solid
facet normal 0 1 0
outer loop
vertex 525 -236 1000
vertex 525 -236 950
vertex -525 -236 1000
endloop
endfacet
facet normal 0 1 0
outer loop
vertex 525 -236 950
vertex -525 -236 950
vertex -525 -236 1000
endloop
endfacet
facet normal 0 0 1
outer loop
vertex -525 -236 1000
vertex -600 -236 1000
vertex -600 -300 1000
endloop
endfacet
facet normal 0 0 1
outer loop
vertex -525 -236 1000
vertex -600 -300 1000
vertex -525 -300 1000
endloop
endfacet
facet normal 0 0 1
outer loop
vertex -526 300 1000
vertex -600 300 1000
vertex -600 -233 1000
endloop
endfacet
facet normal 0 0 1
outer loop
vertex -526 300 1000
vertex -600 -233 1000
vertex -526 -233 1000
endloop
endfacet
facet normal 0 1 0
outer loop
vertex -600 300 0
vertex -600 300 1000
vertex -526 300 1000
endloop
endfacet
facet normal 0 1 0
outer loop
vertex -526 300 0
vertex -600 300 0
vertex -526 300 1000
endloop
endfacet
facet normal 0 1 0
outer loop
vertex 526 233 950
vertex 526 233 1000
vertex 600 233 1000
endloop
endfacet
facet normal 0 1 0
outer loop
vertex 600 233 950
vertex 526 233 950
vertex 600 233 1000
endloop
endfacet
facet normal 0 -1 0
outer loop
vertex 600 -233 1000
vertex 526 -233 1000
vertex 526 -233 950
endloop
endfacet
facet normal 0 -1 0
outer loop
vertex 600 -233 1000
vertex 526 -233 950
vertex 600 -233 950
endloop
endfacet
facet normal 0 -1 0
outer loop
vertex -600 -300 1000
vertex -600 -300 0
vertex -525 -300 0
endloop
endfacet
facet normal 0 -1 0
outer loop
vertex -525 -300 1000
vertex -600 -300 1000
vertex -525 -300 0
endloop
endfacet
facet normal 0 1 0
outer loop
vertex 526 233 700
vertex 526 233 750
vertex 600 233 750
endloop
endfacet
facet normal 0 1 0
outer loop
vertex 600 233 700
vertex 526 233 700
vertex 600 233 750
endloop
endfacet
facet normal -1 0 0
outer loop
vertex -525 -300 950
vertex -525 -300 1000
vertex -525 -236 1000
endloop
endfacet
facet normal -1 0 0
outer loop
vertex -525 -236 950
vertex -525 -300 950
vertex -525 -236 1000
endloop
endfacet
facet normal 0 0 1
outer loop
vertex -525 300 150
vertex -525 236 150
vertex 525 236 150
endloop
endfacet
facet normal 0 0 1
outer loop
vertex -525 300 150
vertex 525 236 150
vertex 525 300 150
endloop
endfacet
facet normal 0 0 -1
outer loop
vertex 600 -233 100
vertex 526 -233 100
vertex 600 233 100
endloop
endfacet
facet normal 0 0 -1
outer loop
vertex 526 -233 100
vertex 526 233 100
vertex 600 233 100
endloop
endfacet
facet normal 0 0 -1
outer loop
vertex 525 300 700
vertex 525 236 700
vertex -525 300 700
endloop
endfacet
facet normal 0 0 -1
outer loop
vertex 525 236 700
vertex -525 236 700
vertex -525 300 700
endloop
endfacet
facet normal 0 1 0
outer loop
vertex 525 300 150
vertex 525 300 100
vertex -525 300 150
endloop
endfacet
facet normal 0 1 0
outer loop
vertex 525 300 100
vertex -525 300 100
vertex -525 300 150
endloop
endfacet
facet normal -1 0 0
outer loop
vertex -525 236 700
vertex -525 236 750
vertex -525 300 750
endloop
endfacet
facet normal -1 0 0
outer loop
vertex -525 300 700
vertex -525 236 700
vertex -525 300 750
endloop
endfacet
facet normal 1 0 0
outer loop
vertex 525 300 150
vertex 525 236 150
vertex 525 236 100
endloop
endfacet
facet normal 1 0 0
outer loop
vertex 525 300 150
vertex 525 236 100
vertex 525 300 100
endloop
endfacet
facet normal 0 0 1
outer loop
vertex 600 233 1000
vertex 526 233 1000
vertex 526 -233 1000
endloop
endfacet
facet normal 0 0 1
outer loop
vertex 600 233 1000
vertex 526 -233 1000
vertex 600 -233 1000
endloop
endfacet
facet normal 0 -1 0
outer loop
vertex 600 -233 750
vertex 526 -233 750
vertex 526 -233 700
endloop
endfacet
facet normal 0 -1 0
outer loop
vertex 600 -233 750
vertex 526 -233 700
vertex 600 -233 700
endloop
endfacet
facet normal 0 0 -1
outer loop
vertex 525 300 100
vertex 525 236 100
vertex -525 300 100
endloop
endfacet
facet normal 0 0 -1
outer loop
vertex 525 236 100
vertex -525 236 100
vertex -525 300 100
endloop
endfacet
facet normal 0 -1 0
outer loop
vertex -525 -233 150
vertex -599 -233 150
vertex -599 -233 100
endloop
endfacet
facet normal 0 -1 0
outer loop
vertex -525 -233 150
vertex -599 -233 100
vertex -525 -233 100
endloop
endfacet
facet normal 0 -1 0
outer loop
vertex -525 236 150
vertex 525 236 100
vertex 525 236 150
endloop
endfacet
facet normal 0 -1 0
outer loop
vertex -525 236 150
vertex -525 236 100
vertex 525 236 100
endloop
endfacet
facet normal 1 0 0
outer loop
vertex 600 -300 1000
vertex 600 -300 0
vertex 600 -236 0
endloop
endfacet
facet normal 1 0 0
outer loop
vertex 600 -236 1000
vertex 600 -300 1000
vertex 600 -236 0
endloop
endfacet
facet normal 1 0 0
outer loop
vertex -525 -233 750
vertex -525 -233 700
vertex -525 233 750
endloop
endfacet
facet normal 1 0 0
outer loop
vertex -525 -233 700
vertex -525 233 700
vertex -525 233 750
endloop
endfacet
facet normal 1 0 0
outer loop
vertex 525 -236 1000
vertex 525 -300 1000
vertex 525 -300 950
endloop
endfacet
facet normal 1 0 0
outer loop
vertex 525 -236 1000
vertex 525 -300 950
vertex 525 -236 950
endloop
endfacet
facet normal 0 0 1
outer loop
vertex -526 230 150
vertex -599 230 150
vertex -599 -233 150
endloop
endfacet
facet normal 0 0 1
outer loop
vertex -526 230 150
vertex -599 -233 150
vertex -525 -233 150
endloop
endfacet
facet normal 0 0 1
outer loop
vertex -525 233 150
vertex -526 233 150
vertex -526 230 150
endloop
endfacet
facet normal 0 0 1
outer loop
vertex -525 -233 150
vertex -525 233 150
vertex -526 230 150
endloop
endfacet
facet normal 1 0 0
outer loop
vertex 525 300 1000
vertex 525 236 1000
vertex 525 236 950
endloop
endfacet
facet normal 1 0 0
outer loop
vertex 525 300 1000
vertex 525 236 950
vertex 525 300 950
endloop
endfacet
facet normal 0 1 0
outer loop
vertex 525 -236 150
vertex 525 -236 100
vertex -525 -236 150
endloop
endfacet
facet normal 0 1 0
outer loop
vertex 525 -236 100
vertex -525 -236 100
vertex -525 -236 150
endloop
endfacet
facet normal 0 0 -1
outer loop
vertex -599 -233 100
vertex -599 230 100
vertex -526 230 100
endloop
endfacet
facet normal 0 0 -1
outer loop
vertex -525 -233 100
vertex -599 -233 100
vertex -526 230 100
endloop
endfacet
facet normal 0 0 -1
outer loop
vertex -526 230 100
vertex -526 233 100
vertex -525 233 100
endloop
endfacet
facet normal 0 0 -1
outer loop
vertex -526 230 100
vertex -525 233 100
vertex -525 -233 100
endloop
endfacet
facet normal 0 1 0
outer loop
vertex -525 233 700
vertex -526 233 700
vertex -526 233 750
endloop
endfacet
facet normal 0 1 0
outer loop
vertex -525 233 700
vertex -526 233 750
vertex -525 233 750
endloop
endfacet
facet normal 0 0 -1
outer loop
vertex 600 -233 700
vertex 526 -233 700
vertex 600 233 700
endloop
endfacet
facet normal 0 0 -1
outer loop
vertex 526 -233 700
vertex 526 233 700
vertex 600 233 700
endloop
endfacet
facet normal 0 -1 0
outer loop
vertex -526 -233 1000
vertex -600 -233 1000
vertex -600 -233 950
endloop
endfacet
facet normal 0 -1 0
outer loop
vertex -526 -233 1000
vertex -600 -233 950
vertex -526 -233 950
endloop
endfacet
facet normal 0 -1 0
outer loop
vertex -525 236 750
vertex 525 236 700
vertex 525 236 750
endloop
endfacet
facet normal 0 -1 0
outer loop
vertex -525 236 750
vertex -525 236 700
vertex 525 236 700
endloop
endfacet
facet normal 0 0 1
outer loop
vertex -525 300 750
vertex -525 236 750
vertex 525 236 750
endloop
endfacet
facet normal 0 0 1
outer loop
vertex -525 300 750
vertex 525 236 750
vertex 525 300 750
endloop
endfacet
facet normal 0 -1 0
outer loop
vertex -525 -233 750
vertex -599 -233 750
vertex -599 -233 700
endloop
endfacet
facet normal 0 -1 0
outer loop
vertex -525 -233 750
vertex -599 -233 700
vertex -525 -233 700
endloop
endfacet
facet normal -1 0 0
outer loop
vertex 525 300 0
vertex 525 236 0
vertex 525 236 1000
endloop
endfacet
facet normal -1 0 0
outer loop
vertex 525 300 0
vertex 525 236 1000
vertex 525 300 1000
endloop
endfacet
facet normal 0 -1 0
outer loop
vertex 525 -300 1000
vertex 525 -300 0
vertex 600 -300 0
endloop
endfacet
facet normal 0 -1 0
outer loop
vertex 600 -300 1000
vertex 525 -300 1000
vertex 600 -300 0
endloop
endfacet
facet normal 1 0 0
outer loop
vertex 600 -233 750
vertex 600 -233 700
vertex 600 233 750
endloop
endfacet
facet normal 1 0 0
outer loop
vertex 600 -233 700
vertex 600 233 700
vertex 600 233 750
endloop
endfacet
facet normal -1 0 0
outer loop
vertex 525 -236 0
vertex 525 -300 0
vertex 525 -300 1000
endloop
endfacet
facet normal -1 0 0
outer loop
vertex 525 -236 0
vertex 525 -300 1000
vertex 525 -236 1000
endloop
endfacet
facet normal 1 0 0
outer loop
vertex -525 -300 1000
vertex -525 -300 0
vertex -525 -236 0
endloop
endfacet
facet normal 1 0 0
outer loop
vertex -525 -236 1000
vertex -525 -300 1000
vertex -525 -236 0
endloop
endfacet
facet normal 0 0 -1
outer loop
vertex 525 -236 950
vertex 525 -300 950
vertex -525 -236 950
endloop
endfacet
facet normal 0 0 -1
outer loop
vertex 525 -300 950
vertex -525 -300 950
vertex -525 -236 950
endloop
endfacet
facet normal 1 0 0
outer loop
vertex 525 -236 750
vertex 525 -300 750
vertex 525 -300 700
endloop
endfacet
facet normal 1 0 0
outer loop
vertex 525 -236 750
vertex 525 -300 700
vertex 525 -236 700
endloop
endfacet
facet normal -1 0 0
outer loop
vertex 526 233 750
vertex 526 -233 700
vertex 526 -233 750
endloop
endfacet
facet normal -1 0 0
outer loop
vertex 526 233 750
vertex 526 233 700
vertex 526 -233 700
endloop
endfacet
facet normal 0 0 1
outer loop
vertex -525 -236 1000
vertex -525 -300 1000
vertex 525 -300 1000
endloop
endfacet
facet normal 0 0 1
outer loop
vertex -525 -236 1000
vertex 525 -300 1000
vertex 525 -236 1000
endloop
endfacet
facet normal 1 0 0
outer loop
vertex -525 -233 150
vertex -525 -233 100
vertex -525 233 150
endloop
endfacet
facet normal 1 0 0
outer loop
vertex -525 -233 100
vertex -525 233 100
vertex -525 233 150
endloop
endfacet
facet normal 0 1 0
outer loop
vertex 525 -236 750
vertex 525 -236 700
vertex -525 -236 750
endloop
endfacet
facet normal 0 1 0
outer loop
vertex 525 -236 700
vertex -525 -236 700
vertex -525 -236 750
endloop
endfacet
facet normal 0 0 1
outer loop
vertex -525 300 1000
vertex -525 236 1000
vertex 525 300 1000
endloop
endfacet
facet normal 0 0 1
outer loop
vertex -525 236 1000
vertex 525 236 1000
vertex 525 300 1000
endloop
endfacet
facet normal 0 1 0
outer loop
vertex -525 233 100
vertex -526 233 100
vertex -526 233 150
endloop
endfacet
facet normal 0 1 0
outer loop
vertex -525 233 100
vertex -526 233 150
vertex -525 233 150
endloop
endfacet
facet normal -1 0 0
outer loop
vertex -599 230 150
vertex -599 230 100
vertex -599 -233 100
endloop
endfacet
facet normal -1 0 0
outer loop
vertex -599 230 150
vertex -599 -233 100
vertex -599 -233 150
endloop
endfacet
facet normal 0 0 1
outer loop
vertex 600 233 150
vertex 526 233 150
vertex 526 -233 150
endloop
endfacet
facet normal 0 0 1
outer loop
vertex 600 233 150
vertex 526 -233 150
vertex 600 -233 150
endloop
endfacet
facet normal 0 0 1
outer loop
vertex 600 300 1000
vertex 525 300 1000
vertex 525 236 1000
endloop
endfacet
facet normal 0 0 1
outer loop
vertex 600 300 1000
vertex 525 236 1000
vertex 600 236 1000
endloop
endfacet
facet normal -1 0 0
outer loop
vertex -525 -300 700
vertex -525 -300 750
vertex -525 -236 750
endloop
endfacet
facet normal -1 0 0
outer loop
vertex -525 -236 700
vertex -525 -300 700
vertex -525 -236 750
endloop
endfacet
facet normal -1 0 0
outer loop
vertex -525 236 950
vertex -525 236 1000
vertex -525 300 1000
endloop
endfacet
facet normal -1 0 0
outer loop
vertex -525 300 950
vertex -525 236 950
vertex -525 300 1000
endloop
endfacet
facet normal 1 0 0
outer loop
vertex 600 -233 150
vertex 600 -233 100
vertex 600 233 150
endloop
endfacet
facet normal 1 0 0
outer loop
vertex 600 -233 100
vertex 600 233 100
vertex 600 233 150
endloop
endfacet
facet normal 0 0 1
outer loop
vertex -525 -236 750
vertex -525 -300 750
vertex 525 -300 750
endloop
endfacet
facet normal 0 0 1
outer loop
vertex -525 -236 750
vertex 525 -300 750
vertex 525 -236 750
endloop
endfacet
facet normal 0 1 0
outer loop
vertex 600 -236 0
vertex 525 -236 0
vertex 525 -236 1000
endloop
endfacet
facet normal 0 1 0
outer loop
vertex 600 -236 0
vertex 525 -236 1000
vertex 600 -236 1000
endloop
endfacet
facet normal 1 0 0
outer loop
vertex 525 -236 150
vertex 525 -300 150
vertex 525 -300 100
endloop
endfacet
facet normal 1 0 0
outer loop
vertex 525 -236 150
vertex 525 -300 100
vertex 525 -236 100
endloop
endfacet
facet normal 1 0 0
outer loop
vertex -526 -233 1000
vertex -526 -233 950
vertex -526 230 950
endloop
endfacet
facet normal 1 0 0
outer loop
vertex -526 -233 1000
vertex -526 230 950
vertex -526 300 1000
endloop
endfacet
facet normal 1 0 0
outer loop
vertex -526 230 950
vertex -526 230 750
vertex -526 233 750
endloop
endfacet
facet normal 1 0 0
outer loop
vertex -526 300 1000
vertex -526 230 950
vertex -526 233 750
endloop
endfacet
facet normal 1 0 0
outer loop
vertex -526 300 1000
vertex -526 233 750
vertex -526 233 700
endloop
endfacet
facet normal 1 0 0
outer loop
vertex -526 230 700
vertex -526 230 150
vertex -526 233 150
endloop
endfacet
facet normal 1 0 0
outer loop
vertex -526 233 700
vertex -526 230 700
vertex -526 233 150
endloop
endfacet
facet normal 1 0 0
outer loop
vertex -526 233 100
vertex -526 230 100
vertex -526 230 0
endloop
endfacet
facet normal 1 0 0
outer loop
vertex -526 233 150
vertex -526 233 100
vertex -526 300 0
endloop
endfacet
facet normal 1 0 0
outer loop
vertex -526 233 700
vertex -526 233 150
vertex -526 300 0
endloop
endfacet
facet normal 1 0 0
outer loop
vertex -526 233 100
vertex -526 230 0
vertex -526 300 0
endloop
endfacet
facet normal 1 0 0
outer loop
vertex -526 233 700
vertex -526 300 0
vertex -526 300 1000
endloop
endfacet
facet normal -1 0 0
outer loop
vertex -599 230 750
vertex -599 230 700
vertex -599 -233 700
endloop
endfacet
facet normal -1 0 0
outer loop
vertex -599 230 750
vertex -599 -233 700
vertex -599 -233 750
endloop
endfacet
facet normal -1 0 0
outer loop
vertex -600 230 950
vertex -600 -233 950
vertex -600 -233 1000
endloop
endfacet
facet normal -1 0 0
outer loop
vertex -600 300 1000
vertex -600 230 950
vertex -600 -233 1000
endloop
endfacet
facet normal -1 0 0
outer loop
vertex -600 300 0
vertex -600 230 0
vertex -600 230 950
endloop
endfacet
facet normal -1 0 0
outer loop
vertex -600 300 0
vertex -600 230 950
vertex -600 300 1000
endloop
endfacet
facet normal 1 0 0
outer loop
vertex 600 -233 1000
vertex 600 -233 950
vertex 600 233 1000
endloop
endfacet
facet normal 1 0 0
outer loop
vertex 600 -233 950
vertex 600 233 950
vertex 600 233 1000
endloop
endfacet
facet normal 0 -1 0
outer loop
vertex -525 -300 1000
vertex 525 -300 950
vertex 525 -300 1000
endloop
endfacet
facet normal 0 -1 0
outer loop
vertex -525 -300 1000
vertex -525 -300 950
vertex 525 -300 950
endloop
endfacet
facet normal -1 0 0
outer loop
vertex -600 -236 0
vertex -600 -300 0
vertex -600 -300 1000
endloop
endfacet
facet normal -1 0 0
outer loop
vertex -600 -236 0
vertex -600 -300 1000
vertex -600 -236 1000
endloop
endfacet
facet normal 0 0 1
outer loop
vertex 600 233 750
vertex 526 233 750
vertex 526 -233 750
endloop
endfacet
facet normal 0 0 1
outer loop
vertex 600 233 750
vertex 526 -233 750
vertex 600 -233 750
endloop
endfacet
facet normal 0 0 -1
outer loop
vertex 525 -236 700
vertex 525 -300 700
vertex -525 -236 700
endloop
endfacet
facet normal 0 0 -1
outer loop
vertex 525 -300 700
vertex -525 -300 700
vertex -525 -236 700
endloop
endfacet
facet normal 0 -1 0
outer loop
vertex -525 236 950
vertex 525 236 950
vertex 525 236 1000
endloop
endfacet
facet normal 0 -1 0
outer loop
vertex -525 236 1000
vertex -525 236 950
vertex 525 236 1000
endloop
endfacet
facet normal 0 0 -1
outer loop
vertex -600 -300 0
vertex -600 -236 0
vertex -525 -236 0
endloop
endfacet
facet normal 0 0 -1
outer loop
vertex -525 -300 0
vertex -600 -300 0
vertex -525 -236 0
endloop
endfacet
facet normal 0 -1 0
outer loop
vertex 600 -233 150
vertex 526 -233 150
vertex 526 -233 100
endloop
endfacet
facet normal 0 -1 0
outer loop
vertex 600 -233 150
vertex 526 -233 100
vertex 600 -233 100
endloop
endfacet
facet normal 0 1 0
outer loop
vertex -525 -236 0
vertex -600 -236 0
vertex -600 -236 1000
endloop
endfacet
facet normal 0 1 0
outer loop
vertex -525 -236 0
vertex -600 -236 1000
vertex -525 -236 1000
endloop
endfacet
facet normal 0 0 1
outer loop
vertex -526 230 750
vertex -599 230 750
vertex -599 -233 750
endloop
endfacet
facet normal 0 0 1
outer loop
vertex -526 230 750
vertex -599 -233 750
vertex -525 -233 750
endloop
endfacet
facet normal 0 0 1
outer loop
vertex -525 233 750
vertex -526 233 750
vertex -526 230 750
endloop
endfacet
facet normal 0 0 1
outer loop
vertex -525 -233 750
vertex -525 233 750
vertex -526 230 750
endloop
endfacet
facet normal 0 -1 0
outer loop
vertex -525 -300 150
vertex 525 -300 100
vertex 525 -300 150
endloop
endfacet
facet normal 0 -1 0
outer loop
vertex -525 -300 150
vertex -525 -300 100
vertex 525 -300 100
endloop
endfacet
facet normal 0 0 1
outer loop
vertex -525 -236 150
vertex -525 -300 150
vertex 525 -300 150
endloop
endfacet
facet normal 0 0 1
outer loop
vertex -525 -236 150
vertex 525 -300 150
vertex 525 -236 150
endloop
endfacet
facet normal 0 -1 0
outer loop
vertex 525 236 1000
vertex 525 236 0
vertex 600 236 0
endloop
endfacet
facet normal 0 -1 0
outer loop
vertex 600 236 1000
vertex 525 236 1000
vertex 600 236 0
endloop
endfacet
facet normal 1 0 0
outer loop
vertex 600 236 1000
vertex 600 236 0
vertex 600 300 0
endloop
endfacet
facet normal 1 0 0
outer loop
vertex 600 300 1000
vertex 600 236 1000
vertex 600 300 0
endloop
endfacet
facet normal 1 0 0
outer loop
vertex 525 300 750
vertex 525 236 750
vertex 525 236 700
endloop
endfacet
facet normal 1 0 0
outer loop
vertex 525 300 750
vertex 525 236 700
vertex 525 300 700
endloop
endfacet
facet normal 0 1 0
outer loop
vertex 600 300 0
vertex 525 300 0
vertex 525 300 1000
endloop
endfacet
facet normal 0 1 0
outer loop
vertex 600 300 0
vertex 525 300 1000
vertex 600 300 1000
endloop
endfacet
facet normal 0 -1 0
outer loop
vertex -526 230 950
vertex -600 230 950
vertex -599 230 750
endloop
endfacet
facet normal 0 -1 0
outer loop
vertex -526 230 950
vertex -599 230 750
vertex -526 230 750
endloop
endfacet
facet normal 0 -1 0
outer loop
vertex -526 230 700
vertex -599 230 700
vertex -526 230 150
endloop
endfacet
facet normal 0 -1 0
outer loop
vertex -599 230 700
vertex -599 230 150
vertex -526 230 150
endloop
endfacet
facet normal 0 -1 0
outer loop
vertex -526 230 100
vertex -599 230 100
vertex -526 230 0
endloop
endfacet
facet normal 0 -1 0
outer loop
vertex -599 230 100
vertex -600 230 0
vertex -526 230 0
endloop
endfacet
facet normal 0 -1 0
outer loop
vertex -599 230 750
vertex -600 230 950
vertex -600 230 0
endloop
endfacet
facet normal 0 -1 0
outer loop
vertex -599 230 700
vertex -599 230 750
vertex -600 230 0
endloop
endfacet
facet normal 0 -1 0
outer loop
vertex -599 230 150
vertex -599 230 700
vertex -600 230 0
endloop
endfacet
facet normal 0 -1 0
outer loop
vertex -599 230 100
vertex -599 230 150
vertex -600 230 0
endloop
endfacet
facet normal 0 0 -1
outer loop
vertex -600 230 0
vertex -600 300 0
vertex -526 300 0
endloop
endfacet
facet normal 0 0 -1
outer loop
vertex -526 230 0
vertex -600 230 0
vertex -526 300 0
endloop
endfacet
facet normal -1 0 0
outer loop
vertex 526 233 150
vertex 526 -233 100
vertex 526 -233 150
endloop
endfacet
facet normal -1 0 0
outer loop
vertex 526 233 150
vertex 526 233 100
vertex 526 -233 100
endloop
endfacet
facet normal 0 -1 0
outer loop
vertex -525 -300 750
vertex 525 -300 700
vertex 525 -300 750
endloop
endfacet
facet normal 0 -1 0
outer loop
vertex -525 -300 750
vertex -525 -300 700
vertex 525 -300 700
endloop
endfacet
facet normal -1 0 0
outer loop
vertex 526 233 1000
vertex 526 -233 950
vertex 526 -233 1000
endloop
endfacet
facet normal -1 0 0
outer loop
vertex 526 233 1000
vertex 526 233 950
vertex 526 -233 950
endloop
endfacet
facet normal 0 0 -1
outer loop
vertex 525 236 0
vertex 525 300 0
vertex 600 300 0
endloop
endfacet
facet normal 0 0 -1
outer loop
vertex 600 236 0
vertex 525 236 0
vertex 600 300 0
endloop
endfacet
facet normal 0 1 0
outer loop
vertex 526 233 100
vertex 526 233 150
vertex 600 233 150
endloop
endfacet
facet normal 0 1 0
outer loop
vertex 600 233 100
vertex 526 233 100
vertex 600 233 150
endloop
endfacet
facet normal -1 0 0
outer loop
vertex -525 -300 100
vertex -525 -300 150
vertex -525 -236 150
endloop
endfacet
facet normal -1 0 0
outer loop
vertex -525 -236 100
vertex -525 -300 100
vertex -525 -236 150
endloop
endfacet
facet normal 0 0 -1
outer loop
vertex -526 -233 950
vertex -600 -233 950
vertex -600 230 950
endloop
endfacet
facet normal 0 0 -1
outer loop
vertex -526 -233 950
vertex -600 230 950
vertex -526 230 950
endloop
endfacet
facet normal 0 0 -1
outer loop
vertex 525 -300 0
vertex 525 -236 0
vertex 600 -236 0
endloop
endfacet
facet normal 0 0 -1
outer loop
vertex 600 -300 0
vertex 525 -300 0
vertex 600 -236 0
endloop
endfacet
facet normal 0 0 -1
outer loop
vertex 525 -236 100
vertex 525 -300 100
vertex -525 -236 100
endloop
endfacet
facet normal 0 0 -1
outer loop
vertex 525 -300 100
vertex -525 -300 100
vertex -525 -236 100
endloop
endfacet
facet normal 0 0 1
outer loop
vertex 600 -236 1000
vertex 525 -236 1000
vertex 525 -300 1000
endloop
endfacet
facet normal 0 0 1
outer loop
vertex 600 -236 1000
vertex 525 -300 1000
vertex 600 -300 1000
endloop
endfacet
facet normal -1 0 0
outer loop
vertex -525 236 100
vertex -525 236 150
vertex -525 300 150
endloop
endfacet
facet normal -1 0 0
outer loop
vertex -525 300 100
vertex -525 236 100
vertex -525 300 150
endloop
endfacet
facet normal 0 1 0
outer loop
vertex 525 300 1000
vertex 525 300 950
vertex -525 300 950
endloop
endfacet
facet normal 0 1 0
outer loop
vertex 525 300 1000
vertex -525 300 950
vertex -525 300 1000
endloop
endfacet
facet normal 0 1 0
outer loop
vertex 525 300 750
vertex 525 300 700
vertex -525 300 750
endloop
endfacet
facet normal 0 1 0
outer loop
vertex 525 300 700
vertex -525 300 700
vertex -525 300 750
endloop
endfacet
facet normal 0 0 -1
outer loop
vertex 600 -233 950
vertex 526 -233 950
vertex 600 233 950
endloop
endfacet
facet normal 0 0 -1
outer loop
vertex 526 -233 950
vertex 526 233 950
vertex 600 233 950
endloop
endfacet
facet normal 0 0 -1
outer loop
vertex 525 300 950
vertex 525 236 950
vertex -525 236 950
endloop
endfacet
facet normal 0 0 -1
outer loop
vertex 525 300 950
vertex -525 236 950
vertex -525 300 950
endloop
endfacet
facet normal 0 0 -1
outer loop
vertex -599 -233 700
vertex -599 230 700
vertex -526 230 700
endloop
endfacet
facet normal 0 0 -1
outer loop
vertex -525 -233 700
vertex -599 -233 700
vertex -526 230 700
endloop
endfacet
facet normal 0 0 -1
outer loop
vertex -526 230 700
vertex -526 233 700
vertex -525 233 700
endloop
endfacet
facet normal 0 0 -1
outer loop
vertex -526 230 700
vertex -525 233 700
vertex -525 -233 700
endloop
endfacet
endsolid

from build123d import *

# Parameters (mm, degrees)
F0_W     = 74
F0_H     = 70
F0_W_2   = 75
F0_H_2   = 64
F1_DEPTH = 1000
F2_W     = 64
F2_H     = 50
F3_DEPTH = 525
F4_W     = 74
F4_H     = 50
F5_DEPTH = 233


with BuildPart() as f1:
    # F0 (on Top) → F1 (new body)
    with BuildSketch(Plane.XY):
        with Locations((-563, 265)):
            Rectangle(F0_W, F0_H)
        with Locations((-562.5, -268)):
            Rectangle(F0_W_2, F0_H_2)
        with Locations((562.5, -268)):
            Rectangle(F0_W_2, F0_H_2)
        with Locations((562.5, 268)):
            Rectangle(F0_W_2, F0_H_2)
    extrude(amount=F1_DEPTH)

    # F4 (on Front) → F5 (join, symmetric)
    with BuildSketch(Plane.XZ):
        with Locations((563, 725)):
            Rectangle(F4_W, F4_H)
        with Locations((563, 125)):
            Rectangle(F4_W, F4_H)
        with Locations((563, 975)):
            Rectangle(F4_W, F4_H)
        with Locations((-562, 125)):
            Rectangle(F4_W, F4_H)
        with Locations((-562, 725)):
            Rectangle(F4_W, F4_H)
        with Locations((-563, 975)):
            Rectangle(F4_W, F4_H)
    extrude(amount=F5_DEPTH, both=True)


with BuildPart() as f3:
    # F2 (on Right) → F3 (new body, symmetric)
    with BuildSketch(Plane.YZ):
        with Locations((-268, 975)):
            Rectangle(F2_W, F2_H)
        with Locations((-268, 725)):
            Rectangle(F2_W, F2_H)
        with Locations((-268, 125)):
            Rectangle(F2_W, F2_H)
        with Locations((268, 125)):
            Rectangle(F2_W, F2_H)
        with Locations((268, 725)):
            Rectangle(F2_W, F2_H)
        with Locations((268, 975)):
            Rectangle(F2_W, F2_H)
    extrude(amount=F3_DEPTH, both=True)


solid = Compound([f1.part, f3.part])
